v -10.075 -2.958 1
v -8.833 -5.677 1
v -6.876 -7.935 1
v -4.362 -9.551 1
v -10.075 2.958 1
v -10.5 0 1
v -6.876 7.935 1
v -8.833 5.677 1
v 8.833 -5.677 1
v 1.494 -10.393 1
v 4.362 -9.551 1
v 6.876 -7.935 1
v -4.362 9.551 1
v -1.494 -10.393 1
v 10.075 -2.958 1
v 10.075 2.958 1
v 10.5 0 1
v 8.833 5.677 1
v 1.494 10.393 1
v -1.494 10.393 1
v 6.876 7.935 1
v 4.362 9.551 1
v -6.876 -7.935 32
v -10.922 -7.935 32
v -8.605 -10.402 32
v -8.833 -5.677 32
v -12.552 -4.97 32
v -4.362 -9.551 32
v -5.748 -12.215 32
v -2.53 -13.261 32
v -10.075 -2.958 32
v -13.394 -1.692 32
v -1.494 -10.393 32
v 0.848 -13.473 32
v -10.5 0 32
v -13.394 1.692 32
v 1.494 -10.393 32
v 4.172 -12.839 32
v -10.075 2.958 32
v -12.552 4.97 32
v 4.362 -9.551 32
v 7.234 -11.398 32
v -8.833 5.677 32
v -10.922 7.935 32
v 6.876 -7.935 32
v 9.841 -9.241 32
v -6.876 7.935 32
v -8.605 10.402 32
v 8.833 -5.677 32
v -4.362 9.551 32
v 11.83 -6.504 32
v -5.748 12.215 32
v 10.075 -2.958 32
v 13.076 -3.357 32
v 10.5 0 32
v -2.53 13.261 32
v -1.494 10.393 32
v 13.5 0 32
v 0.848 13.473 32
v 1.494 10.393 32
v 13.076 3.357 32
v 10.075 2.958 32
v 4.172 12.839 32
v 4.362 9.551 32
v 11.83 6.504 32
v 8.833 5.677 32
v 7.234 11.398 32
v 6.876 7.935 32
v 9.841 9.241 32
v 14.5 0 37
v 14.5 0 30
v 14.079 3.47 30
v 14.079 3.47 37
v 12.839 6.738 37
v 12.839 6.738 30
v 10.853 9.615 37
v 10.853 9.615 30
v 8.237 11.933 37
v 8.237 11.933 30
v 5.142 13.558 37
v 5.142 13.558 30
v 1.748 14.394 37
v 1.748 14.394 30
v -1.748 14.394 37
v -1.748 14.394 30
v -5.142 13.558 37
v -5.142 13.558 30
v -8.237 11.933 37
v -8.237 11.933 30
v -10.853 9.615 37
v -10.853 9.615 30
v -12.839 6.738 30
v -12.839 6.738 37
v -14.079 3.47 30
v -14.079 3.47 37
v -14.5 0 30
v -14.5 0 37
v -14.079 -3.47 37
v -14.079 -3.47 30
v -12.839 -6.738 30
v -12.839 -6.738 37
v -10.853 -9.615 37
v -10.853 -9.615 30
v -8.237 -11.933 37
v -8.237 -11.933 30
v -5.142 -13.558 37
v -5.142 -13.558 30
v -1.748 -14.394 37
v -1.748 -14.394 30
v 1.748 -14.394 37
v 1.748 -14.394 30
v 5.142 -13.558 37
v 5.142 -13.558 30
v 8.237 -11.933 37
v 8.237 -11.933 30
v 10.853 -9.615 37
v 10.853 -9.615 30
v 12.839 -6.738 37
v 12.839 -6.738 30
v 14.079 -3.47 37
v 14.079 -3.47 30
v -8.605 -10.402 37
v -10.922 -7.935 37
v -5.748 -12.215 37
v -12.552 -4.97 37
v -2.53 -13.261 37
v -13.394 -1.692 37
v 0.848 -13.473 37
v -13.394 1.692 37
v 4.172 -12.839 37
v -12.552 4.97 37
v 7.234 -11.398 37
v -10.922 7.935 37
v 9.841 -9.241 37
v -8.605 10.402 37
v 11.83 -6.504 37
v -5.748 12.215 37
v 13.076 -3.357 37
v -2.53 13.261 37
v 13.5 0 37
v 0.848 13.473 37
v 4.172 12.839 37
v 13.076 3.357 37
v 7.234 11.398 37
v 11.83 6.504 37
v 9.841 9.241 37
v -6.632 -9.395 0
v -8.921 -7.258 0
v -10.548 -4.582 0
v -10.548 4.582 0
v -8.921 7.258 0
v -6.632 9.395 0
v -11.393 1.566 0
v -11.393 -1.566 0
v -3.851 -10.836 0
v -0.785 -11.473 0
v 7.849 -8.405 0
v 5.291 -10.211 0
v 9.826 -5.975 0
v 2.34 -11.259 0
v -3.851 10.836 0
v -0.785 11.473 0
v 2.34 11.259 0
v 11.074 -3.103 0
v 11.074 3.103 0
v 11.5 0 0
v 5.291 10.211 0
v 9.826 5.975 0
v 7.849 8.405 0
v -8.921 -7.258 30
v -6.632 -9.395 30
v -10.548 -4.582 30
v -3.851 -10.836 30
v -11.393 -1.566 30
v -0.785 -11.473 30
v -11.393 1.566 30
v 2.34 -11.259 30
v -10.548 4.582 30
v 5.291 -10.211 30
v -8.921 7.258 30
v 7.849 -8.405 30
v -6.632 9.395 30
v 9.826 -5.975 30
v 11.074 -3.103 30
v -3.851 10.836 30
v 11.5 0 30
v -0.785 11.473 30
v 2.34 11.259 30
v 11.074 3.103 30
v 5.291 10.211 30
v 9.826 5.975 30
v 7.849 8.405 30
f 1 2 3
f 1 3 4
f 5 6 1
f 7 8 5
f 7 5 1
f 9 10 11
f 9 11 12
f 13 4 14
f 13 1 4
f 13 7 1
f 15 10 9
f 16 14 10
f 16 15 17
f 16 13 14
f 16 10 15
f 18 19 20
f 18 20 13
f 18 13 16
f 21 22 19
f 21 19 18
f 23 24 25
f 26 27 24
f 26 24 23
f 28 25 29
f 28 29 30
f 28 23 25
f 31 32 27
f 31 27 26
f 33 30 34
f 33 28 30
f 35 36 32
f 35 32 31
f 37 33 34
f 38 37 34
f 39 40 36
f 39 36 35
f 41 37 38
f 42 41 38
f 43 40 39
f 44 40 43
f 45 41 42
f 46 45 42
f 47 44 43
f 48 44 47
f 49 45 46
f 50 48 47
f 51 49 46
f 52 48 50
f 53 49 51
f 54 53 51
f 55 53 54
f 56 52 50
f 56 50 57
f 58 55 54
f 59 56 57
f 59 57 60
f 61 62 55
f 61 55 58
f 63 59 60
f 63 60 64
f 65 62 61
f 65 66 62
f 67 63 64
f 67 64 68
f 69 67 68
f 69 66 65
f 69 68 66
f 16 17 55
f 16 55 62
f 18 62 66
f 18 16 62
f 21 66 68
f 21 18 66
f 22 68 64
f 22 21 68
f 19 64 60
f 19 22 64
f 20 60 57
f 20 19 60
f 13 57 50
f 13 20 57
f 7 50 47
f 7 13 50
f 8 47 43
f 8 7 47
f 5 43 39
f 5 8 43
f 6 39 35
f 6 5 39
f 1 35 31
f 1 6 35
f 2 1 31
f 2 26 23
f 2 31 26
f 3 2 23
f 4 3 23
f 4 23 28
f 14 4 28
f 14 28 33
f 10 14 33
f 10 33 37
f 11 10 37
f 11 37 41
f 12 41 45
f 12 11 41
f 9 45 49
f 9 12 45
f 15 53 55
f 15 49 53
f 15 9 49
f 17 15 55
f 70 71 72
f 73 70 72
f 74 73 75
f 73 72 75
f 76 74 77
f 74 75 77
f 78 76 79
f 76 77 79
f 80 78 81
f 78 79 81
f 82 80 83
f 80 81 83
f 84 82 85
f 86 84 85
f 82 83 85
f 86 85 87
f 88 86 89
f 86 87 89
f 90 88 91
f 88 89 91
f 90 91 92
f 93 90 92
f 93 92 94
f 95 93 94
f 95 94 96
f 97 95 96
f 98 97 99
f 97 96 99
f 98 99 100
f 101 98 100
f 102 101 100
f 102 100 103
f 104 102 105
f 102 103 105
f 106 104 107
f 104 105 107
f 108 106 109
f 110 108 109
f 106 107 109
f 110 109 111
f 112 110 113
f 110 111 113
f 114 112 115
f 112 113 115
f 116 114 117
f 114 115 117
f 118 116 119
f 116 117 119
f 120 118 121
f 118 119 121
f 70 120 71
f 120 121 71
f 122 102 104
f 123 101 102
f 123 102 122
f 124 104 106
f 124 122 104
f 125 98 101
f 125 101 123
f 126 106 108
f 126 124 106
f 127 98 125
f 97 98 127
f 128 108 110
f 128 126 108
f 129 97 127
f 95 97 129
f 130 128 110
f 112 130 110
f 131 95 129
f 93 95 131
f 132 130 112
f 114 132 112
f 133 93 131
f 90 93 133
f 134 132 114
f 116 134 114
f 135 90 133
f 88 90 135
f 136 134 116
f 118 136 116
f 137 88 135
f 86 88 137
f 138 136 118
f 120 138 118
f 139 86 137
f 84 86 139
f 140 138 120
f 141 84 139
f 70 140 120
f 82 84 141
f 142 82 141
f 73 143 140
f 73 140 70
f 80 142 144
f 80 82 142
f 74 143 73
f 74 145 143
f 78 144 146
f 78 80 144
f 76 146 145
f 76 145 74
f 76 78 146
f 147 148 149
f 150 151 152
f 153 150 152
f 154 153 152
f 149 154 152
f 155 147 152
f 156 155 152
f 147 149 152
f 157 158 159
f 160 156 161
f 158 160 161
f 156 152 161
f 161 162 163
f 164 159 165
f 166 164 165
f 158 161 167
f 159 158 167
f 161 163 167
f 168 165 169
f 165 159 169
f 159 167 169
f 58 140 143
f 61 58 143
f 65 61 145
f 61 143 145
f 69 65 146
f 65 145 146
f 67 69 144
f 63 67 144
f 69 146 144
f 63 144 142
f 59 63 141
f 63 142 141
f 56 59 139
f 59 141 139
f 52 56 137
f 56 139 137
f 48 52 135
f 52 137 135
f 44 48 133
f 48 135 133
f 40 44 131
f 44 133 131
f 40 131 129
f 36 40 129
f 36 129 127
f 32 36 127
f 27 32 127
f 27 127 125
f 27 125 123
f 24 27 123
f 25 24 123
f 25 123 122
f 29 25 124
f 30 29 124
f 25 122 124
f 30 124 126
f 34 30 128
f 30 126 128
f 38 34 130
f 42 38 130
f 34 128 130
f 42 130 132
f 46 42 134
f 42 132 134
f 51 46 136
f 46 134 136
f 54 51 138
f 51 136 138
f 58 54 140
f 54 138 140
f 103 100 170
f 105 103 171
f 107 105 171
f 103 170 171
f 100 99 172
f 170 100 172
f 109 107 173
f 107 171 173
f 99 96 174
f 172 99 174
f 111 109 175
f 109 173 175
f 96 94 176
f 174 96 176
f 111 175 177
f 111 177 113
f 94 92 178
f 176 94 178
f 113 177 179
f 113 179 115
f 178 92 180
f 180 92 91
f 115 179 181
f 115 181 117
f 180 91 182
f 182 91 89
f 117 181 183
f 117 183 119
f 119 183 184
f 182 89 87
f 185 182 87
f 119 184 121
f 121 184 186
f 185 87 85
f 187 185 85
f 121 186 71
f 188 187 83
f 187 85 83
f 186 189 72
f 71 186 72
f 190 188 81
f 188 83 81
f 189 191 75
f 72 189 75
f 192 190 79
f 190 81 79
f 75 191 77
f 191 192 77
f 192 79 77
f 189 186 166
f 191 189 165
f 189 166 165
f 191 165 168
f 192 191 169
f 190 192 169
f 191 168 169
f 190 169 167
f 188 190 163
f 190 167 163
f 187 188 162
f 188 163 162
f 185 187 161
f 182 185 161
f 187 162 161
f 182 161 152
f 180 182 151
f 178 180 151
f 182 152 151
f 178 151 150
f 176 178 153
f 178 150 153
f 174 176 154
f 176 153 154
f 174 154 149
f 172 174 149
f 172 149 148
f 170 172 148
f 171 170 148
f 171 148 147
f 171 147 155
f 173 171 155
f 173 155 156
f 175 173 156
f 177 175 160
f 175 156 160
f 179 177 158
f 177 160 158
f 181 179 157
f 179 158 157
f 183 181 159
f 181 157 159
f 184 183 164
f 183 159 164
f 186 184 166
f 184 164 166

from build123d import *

# Parameters (mm, degrees)
SKETCH_1_R          = 11.5
EXTRUDE_1_DEPTH     = 30
SKETCH_3_R          = 14.5
EXTRUDE_2_DEPTH     = 7
SKETCH_4_R          = 13.5
CUT_EXTRUDE_3_DEPTH = 5
CUT_EXTRUDE_START   = 1
SKETCH_2_R          = 10.5
CUT_EXTRUDE_2_DEPTH = 37


with BuildPart() as part:
    # ｽｹｯﾁ1 → ﾎﾞｽ - 押し出し1 (new body)
    with BuildSketch(Plane.XY):
        Circle(SKETCH_1_R)
    extrude(amount=EXTRUDE_1_DEPTH)

    # ｽｹｯﾁ3 → ﾎﾞｽ - 押し出し2 (add)
    with BuildSketch(Plane.XY.offset(30)):
        Circle(SKETCH_3_R)
    extrude(amount=EXTRUDE_2_DEPTH)

    # ｽｹｯﾁ4 → ｶｯﾄ - 押し出し3 (cut)
    with BuildSketch(Plane.XY.offset(37)):
        Circle(SKETCH_4_R)
    extrude(amount=-CUT_EXTRUDE_3_DEPTH, mode=Mode.SUBTRACT)

    # ｽｹｯﾁ2 → ｶｯﾄ - 押し出し2 (cut, through all)
    with BuildSketch(Plane.XY.offset(CUT_EXTRUDE_START)):
        Circle(SKETCH_2_R)
    extrude(amount=CUT_EXTRUDE_2_DEPTH, mode=Mode.SUBTRACT)


solid = part.part
